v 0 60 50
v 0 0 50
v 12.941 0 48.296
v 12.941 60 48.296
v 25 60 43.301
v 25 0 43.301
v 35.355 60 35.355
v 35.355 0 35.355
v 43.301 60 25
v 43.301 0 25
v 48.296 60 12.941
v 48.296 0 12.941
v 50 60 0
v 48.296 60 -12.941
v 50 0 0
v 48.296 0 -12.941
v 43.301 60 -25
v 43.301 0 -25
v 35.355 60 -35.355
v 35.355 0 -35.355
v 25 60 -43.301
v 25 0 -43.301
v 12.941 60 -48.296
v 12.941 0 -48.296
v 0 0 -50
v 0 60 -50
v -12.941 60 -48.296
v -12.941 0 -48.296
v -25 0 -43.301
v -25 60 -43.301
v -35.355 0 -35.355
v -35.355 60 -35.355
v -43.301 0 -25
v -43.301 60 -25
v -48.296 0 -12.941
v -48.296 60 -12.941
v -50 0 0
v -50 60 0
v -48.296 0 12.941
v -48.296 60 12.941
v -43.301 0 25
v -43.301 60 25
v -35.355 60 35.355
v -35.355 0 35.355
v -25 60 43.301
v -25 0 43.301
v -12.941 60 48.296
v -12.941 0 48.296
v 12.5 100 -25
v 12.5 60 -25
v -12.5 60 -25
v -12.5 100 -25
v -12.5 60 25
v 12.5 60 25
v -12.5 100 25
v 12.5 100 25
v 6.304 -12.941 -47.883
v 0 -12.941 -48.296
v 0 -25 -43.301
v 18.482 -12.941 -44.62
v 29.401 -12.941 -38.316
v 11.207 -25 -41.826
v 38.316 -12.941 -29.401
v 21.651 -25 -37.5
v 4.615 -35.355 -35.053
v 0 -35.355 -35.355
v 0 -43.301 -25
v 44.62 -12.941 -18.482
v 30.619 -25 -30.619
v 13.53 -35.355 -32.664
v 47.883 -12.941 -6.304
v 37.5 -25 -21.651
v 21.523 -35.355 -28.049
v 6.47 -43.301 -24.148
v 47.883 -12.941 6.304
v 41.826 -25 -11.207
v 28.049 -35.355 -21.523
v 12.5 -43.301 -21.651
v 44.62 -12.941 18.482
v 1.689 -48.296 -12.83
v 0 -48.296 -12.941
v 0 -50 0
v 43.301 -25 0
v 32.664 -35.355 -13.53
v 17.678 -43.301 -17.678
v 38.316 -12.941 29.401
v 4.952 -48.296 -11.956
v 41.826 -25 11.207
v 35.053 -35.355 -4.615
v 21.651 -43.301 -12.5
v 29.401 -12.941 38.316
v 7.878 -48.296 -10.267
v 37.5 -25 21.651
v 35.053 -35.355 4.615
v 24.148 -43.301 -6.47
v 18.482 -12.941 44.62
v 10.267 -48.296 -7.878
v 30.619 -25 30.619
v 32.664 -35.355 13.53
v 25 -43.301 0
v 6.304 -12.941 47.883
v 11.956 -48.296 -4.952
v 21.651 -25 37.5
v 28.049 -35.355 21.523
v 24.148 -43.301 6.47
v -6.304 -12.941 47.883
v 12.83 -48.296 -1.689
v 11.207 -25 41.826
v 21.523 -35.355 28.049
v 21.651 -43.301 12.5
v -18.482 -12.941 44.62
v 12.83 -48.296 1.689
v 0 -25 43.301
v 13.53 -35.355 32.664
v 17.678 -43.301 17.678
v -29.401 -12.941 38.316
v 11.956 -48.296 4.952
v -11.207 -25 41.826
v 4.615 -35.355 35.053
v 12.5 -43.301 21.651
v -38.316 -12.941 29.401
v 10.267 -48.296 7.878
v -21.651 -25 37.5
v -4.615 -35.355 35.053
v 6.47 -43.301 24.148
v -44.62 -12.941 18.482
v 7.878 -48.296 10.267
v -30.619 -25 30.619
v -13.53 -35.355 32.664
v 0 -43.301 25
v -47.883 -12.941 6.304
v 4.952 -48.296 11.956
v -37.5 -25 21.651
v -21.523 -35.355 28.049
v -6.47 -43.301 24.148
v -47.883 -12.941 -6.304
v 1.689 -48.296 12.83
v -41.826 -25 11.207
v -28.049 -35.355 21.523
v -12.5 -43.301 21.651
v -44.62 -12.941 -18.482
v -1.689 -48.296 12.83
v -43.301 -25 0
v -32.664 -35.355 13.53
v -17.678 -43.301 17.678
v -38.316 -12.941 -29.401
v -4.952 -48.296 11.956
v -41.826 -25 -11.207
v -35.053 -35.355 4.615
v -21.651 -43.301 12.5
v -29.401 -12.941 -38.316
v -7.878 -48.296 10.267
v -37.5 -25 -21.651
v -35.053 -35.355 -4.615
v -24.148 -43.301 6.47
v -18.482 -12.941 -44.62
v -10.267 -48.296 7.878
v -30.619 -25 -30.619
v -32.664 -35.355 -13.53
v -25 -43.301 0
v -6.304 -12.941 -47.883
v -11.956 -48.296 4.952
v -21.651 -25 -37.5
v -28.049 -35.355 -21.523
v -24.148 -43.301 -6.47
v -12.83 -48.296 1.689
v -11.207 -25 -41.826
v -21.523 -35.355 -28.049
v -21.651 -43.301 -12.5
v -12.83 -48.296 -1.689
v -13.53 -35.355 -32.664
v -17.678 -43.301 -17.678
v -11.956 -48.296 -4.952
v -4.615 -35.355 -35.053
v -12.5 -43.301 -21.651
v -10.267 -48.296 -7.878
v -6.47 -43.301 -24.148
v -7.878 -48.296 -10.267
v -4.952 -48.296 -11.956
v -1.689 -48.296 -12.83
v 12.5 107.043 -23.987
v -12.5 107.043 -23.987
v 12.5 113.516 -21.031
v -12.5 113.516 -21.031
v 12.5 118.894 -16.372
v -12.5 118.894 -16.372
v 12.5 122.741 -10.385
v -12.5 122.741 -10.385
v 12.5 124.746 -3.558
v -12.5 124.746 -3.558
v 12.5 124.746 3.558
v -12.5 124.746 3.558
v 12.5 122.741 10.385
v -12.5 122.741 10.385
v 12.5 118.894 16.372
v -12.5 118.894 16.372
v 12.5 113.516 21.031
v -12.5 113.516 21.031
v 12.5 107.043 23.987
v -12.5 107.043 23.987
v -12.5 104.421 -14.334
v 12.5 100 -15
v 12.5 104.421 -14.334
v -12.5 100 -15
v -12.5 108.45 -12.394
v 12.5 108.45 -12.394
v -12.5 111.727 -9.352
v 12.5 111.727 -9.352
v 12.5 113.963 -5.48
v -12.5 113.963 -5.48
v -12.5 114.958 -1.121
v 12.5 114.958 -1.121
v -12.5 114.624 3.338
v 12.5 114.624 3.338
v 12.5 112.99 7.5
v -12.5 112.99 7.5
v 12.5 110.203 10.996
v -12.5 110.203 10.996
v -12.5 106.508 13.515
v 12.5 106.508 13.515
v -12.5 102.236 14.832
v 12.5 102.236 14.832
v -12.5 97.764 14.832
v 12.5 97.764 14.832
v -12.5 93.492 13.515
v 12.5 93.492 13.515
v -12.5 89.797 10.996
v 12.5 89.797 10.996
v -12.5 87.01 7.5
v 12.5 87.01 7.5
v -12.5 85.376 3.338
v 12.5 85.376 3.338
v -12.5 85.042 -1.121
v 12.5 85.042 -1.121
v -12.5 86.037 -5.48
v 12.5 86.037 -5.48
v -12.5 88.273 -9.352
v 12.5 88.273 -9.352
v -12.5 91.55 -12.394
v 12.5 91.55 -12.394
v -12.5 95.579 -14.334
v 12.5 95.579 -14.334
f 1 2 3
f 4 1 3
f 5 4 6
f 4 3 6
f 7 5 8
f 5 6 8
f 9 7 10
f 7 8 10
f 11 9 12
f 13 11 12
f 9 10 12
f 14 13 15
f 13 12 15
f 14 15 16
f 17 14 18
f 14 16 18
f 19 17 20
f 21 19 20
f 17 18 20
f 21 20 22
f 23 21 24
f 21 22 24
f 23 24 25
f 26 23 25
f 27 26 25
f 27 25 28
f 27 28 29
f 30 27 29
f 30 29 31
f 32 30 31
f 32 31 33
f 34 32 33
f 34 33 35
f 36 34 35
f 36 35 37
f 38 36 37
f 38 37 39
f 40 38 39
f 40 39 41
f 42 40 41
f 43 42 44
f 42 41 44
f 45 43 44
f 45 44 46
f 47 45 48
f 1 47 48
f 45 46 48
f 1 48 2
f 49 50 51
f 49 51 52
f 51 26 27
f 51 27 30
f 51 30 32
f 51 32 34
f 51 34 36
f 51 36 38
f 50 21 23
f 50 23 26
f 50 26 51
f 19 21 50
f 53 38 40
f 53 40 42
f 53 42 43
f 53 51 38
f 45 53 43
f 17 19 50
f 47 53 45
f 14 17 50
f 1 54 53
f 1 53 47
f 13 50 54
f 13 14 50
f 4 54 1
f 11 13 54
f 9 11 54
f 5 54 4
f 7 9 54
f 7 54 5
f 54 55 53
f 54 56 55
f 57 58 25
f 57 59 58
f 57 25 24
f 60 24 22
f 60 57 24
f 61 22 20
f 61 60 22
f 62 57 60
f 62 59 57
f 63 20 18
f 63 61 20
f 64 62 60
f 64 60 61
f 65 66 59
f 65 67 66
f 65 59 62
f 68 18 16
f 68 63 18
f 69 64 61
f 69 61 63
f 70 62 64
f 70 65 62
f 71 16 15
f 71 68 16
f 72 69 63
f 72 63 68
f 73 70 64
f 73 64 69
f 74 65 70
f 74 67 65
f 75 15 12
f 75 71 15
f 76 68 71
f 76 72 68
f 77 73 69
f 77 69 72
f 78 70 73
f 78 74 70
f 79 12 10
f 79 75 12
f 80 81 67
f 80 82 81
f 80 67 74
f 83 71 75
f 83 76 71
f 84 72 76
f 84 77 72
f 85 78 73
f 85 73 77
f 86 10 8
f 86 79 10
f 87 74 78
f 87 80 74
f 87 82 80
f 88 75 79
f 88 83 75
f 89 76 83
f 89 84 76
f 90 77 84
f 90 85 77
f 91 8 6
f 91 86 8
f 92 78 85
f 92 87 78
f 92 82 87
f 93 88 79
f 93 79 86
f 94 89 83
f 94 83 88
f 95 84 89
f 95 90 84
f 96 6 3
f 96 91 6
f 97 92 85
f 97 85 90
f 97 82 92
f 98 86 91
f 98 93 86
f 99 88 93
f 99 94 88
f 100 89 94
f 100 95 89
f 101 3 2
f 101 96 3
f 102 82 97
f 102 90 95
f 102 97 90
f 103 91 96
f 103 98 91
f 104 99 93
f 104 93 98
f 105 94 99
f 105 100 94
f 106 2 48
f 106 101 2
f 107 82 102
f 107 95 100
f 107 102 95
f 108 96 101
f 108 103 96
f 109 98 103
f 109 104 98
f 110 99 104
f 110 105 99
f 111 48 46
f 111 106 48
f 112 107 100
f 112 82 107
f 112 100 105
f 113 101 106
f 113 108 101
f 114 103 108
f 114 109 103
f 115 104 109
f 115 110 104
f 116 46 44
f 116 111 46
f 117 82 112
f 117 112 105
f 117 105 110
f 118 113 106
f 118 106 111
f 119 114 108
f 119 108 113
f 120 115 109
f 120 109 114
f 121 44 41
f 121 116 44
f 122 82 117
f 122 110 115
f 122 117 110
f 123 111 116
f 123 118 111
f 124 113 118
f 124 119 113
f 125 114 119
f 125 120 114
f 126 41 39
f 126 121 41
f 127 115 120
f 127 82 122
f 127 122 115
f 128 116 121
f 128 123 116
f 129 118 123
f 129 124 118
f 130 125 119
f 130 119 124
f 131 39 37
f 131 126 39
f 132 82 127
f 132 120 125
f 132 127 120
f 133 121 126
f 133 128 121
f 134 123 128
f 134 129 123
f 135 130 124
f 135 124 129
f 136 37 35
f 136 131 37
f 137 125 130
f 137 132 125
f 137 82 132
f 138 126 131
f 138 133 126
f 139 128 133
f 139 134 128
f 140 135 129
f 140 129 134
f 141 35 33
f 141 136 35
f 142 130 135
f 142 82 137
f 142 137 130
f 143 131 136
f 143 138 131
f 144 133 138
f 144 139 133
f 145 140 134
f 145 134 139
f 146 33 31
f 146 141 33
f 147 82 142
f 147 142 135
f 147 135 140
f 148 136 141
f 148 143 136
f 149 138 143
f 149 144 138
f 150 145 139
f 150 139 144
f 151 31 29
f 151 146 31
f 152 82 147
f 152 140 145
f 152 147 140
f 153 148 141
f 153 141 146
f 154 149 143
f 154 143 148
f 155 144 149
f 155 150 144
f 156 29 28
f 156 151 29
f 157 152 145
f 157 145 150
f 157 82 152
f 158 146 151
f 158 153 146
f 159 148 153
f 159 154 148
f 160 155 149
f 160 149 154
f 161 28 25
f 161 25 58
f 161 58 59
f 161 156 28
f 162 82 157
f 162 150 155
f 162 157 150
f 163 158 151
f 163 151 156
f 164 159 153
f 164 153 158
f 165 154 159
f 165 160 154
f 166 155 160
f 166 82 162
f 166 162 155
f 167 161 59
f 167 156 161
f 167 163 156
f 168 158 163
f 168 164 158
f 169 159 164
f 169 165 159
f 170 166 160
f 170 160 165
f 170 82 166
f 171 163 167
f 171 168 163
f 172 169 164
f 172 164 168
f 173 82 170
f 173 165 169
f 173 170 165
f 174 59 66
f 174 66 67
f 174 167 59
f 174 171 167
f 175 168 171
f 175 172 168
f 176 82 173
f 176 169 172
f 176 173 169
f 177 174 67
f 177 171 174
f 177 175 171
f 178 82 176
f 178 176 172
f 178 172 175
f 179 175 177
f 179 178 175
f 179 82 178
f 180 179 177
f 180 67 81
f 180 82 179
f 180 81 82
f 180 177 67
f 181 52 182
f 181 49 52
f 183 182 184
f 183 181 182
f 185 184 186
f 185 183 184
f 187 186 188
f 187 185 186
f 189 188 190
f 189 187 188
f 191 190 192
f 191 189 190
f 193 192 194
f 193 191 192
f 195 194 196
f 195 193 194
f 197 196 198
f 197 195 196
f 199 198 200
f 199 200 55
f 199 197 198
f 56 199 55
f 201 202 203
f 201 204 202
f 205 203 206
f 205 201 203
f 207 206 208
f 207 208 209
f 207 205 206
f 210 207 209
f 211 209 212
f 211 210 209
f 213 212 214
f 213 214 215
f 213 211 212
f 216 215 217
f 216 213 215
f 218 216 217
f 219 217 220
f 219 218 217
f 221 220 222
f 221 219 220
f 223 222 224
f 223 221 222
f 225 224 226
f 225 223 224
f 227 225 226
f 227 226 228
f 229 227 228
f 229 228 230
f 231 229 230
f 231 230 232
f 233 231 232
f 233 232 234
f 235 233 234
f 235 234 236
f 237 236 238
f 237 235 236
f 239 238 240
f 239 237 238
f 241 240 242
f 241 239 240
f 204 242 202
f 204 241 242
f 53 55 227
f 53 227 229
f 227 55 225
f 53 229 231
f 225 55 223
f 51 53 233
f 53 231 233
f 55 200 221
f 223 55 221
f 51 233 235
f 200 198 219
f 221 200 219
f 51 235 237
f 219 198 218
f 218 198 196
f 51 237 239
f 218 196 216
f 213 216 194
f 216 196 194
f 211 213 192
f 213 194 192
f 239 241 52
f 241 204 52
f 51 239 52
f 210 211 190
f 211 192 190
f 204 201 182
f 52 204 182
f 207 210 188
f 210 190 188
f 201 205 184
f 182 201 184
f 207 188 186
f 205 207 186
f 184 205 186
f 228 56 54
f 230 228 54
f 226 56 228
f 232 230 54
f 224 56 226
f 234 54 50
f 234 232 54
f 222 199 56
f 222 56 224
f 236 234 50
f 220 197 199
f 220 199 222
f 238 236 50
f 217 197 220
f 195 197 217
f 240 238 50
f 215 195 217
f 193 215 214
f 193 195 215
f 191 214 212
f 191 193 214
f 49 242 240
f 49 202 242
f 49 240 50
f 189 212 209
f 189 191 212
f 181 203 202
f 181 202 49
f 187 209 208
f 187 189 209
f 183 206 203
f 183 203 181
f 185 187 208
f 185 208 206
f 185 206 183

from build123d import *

# Parameters (mm, degrees)
SKETCH1_R           = 50
BOSS_EXTRUDE1_DEPTH = 60
SKETCH2_R           = 15
BOSS_EXTRUDE2_DEPTH = 12.5
DOME1_FACE_RADIUS   = 50
DOME1_HEIGHT        = 50


with BuildPart() as part:
    # Sketch1 → Boss-Extrude1 (new body)
    with BuildSketch(Plane(origin=(0, 0, 0), x_dir=(1, 0, 0), z_dir=(0, 1, 0))):
        with Locations(Location((0, 0, 0), (0, 0, 270))):
            Circle(SKETCH1_R)
    extrude(amount=BOSS_EXTRUDE1_DEPTH)

    # Sketch2 → Boss-Extrude2 (add, symmetric)
    with BuildSketch(Plane(origin=(0, 0, 0), x_dir=(0, 0, -1), z_dir=(1, 0, 0))):
        with BuildLine():
            Line((-25, 100), (-25, 60))
            Line((-25, 60), (25, 60))
            Line((25, 60), (25, 100))
            ThreePointArc((25, 100), (0, 125), (-25, 100))
        make_face()
        with Locations((0, 100)):
            Circle(SKETCH2_R, mode=Mode.SUBTRACT)
    extrude(amount=BOSS_EXTRUDE2_DEPTH, both=True)

    # Dome1: a dome of height H over a round flat face of radius A is a cap of a sphere of radius (A * A + H * H) / (2 * H)
    dome1_r = (DOME1_FACE_RADIUS * DOME1_FACE_RADIUS + DOME1_HEIGHT * DOME1_HEIGHT) / (2 * DOME1_HEIGHT)
    dome1_base = Plane((0, 0, 0), z_dir=(0, -1, 0))
    with Locations(dome1_base.offset(DOME1_HEIGHT - dome1_r)):
        dome1_ball = Sphere(dome1_r, mode=Mode.PRIVATE)
    add(split(dome1_ball, bisect_by=dome1_base, keep=Keep.TOP, mode=Mode.PRIVATE))


solid = part.part
